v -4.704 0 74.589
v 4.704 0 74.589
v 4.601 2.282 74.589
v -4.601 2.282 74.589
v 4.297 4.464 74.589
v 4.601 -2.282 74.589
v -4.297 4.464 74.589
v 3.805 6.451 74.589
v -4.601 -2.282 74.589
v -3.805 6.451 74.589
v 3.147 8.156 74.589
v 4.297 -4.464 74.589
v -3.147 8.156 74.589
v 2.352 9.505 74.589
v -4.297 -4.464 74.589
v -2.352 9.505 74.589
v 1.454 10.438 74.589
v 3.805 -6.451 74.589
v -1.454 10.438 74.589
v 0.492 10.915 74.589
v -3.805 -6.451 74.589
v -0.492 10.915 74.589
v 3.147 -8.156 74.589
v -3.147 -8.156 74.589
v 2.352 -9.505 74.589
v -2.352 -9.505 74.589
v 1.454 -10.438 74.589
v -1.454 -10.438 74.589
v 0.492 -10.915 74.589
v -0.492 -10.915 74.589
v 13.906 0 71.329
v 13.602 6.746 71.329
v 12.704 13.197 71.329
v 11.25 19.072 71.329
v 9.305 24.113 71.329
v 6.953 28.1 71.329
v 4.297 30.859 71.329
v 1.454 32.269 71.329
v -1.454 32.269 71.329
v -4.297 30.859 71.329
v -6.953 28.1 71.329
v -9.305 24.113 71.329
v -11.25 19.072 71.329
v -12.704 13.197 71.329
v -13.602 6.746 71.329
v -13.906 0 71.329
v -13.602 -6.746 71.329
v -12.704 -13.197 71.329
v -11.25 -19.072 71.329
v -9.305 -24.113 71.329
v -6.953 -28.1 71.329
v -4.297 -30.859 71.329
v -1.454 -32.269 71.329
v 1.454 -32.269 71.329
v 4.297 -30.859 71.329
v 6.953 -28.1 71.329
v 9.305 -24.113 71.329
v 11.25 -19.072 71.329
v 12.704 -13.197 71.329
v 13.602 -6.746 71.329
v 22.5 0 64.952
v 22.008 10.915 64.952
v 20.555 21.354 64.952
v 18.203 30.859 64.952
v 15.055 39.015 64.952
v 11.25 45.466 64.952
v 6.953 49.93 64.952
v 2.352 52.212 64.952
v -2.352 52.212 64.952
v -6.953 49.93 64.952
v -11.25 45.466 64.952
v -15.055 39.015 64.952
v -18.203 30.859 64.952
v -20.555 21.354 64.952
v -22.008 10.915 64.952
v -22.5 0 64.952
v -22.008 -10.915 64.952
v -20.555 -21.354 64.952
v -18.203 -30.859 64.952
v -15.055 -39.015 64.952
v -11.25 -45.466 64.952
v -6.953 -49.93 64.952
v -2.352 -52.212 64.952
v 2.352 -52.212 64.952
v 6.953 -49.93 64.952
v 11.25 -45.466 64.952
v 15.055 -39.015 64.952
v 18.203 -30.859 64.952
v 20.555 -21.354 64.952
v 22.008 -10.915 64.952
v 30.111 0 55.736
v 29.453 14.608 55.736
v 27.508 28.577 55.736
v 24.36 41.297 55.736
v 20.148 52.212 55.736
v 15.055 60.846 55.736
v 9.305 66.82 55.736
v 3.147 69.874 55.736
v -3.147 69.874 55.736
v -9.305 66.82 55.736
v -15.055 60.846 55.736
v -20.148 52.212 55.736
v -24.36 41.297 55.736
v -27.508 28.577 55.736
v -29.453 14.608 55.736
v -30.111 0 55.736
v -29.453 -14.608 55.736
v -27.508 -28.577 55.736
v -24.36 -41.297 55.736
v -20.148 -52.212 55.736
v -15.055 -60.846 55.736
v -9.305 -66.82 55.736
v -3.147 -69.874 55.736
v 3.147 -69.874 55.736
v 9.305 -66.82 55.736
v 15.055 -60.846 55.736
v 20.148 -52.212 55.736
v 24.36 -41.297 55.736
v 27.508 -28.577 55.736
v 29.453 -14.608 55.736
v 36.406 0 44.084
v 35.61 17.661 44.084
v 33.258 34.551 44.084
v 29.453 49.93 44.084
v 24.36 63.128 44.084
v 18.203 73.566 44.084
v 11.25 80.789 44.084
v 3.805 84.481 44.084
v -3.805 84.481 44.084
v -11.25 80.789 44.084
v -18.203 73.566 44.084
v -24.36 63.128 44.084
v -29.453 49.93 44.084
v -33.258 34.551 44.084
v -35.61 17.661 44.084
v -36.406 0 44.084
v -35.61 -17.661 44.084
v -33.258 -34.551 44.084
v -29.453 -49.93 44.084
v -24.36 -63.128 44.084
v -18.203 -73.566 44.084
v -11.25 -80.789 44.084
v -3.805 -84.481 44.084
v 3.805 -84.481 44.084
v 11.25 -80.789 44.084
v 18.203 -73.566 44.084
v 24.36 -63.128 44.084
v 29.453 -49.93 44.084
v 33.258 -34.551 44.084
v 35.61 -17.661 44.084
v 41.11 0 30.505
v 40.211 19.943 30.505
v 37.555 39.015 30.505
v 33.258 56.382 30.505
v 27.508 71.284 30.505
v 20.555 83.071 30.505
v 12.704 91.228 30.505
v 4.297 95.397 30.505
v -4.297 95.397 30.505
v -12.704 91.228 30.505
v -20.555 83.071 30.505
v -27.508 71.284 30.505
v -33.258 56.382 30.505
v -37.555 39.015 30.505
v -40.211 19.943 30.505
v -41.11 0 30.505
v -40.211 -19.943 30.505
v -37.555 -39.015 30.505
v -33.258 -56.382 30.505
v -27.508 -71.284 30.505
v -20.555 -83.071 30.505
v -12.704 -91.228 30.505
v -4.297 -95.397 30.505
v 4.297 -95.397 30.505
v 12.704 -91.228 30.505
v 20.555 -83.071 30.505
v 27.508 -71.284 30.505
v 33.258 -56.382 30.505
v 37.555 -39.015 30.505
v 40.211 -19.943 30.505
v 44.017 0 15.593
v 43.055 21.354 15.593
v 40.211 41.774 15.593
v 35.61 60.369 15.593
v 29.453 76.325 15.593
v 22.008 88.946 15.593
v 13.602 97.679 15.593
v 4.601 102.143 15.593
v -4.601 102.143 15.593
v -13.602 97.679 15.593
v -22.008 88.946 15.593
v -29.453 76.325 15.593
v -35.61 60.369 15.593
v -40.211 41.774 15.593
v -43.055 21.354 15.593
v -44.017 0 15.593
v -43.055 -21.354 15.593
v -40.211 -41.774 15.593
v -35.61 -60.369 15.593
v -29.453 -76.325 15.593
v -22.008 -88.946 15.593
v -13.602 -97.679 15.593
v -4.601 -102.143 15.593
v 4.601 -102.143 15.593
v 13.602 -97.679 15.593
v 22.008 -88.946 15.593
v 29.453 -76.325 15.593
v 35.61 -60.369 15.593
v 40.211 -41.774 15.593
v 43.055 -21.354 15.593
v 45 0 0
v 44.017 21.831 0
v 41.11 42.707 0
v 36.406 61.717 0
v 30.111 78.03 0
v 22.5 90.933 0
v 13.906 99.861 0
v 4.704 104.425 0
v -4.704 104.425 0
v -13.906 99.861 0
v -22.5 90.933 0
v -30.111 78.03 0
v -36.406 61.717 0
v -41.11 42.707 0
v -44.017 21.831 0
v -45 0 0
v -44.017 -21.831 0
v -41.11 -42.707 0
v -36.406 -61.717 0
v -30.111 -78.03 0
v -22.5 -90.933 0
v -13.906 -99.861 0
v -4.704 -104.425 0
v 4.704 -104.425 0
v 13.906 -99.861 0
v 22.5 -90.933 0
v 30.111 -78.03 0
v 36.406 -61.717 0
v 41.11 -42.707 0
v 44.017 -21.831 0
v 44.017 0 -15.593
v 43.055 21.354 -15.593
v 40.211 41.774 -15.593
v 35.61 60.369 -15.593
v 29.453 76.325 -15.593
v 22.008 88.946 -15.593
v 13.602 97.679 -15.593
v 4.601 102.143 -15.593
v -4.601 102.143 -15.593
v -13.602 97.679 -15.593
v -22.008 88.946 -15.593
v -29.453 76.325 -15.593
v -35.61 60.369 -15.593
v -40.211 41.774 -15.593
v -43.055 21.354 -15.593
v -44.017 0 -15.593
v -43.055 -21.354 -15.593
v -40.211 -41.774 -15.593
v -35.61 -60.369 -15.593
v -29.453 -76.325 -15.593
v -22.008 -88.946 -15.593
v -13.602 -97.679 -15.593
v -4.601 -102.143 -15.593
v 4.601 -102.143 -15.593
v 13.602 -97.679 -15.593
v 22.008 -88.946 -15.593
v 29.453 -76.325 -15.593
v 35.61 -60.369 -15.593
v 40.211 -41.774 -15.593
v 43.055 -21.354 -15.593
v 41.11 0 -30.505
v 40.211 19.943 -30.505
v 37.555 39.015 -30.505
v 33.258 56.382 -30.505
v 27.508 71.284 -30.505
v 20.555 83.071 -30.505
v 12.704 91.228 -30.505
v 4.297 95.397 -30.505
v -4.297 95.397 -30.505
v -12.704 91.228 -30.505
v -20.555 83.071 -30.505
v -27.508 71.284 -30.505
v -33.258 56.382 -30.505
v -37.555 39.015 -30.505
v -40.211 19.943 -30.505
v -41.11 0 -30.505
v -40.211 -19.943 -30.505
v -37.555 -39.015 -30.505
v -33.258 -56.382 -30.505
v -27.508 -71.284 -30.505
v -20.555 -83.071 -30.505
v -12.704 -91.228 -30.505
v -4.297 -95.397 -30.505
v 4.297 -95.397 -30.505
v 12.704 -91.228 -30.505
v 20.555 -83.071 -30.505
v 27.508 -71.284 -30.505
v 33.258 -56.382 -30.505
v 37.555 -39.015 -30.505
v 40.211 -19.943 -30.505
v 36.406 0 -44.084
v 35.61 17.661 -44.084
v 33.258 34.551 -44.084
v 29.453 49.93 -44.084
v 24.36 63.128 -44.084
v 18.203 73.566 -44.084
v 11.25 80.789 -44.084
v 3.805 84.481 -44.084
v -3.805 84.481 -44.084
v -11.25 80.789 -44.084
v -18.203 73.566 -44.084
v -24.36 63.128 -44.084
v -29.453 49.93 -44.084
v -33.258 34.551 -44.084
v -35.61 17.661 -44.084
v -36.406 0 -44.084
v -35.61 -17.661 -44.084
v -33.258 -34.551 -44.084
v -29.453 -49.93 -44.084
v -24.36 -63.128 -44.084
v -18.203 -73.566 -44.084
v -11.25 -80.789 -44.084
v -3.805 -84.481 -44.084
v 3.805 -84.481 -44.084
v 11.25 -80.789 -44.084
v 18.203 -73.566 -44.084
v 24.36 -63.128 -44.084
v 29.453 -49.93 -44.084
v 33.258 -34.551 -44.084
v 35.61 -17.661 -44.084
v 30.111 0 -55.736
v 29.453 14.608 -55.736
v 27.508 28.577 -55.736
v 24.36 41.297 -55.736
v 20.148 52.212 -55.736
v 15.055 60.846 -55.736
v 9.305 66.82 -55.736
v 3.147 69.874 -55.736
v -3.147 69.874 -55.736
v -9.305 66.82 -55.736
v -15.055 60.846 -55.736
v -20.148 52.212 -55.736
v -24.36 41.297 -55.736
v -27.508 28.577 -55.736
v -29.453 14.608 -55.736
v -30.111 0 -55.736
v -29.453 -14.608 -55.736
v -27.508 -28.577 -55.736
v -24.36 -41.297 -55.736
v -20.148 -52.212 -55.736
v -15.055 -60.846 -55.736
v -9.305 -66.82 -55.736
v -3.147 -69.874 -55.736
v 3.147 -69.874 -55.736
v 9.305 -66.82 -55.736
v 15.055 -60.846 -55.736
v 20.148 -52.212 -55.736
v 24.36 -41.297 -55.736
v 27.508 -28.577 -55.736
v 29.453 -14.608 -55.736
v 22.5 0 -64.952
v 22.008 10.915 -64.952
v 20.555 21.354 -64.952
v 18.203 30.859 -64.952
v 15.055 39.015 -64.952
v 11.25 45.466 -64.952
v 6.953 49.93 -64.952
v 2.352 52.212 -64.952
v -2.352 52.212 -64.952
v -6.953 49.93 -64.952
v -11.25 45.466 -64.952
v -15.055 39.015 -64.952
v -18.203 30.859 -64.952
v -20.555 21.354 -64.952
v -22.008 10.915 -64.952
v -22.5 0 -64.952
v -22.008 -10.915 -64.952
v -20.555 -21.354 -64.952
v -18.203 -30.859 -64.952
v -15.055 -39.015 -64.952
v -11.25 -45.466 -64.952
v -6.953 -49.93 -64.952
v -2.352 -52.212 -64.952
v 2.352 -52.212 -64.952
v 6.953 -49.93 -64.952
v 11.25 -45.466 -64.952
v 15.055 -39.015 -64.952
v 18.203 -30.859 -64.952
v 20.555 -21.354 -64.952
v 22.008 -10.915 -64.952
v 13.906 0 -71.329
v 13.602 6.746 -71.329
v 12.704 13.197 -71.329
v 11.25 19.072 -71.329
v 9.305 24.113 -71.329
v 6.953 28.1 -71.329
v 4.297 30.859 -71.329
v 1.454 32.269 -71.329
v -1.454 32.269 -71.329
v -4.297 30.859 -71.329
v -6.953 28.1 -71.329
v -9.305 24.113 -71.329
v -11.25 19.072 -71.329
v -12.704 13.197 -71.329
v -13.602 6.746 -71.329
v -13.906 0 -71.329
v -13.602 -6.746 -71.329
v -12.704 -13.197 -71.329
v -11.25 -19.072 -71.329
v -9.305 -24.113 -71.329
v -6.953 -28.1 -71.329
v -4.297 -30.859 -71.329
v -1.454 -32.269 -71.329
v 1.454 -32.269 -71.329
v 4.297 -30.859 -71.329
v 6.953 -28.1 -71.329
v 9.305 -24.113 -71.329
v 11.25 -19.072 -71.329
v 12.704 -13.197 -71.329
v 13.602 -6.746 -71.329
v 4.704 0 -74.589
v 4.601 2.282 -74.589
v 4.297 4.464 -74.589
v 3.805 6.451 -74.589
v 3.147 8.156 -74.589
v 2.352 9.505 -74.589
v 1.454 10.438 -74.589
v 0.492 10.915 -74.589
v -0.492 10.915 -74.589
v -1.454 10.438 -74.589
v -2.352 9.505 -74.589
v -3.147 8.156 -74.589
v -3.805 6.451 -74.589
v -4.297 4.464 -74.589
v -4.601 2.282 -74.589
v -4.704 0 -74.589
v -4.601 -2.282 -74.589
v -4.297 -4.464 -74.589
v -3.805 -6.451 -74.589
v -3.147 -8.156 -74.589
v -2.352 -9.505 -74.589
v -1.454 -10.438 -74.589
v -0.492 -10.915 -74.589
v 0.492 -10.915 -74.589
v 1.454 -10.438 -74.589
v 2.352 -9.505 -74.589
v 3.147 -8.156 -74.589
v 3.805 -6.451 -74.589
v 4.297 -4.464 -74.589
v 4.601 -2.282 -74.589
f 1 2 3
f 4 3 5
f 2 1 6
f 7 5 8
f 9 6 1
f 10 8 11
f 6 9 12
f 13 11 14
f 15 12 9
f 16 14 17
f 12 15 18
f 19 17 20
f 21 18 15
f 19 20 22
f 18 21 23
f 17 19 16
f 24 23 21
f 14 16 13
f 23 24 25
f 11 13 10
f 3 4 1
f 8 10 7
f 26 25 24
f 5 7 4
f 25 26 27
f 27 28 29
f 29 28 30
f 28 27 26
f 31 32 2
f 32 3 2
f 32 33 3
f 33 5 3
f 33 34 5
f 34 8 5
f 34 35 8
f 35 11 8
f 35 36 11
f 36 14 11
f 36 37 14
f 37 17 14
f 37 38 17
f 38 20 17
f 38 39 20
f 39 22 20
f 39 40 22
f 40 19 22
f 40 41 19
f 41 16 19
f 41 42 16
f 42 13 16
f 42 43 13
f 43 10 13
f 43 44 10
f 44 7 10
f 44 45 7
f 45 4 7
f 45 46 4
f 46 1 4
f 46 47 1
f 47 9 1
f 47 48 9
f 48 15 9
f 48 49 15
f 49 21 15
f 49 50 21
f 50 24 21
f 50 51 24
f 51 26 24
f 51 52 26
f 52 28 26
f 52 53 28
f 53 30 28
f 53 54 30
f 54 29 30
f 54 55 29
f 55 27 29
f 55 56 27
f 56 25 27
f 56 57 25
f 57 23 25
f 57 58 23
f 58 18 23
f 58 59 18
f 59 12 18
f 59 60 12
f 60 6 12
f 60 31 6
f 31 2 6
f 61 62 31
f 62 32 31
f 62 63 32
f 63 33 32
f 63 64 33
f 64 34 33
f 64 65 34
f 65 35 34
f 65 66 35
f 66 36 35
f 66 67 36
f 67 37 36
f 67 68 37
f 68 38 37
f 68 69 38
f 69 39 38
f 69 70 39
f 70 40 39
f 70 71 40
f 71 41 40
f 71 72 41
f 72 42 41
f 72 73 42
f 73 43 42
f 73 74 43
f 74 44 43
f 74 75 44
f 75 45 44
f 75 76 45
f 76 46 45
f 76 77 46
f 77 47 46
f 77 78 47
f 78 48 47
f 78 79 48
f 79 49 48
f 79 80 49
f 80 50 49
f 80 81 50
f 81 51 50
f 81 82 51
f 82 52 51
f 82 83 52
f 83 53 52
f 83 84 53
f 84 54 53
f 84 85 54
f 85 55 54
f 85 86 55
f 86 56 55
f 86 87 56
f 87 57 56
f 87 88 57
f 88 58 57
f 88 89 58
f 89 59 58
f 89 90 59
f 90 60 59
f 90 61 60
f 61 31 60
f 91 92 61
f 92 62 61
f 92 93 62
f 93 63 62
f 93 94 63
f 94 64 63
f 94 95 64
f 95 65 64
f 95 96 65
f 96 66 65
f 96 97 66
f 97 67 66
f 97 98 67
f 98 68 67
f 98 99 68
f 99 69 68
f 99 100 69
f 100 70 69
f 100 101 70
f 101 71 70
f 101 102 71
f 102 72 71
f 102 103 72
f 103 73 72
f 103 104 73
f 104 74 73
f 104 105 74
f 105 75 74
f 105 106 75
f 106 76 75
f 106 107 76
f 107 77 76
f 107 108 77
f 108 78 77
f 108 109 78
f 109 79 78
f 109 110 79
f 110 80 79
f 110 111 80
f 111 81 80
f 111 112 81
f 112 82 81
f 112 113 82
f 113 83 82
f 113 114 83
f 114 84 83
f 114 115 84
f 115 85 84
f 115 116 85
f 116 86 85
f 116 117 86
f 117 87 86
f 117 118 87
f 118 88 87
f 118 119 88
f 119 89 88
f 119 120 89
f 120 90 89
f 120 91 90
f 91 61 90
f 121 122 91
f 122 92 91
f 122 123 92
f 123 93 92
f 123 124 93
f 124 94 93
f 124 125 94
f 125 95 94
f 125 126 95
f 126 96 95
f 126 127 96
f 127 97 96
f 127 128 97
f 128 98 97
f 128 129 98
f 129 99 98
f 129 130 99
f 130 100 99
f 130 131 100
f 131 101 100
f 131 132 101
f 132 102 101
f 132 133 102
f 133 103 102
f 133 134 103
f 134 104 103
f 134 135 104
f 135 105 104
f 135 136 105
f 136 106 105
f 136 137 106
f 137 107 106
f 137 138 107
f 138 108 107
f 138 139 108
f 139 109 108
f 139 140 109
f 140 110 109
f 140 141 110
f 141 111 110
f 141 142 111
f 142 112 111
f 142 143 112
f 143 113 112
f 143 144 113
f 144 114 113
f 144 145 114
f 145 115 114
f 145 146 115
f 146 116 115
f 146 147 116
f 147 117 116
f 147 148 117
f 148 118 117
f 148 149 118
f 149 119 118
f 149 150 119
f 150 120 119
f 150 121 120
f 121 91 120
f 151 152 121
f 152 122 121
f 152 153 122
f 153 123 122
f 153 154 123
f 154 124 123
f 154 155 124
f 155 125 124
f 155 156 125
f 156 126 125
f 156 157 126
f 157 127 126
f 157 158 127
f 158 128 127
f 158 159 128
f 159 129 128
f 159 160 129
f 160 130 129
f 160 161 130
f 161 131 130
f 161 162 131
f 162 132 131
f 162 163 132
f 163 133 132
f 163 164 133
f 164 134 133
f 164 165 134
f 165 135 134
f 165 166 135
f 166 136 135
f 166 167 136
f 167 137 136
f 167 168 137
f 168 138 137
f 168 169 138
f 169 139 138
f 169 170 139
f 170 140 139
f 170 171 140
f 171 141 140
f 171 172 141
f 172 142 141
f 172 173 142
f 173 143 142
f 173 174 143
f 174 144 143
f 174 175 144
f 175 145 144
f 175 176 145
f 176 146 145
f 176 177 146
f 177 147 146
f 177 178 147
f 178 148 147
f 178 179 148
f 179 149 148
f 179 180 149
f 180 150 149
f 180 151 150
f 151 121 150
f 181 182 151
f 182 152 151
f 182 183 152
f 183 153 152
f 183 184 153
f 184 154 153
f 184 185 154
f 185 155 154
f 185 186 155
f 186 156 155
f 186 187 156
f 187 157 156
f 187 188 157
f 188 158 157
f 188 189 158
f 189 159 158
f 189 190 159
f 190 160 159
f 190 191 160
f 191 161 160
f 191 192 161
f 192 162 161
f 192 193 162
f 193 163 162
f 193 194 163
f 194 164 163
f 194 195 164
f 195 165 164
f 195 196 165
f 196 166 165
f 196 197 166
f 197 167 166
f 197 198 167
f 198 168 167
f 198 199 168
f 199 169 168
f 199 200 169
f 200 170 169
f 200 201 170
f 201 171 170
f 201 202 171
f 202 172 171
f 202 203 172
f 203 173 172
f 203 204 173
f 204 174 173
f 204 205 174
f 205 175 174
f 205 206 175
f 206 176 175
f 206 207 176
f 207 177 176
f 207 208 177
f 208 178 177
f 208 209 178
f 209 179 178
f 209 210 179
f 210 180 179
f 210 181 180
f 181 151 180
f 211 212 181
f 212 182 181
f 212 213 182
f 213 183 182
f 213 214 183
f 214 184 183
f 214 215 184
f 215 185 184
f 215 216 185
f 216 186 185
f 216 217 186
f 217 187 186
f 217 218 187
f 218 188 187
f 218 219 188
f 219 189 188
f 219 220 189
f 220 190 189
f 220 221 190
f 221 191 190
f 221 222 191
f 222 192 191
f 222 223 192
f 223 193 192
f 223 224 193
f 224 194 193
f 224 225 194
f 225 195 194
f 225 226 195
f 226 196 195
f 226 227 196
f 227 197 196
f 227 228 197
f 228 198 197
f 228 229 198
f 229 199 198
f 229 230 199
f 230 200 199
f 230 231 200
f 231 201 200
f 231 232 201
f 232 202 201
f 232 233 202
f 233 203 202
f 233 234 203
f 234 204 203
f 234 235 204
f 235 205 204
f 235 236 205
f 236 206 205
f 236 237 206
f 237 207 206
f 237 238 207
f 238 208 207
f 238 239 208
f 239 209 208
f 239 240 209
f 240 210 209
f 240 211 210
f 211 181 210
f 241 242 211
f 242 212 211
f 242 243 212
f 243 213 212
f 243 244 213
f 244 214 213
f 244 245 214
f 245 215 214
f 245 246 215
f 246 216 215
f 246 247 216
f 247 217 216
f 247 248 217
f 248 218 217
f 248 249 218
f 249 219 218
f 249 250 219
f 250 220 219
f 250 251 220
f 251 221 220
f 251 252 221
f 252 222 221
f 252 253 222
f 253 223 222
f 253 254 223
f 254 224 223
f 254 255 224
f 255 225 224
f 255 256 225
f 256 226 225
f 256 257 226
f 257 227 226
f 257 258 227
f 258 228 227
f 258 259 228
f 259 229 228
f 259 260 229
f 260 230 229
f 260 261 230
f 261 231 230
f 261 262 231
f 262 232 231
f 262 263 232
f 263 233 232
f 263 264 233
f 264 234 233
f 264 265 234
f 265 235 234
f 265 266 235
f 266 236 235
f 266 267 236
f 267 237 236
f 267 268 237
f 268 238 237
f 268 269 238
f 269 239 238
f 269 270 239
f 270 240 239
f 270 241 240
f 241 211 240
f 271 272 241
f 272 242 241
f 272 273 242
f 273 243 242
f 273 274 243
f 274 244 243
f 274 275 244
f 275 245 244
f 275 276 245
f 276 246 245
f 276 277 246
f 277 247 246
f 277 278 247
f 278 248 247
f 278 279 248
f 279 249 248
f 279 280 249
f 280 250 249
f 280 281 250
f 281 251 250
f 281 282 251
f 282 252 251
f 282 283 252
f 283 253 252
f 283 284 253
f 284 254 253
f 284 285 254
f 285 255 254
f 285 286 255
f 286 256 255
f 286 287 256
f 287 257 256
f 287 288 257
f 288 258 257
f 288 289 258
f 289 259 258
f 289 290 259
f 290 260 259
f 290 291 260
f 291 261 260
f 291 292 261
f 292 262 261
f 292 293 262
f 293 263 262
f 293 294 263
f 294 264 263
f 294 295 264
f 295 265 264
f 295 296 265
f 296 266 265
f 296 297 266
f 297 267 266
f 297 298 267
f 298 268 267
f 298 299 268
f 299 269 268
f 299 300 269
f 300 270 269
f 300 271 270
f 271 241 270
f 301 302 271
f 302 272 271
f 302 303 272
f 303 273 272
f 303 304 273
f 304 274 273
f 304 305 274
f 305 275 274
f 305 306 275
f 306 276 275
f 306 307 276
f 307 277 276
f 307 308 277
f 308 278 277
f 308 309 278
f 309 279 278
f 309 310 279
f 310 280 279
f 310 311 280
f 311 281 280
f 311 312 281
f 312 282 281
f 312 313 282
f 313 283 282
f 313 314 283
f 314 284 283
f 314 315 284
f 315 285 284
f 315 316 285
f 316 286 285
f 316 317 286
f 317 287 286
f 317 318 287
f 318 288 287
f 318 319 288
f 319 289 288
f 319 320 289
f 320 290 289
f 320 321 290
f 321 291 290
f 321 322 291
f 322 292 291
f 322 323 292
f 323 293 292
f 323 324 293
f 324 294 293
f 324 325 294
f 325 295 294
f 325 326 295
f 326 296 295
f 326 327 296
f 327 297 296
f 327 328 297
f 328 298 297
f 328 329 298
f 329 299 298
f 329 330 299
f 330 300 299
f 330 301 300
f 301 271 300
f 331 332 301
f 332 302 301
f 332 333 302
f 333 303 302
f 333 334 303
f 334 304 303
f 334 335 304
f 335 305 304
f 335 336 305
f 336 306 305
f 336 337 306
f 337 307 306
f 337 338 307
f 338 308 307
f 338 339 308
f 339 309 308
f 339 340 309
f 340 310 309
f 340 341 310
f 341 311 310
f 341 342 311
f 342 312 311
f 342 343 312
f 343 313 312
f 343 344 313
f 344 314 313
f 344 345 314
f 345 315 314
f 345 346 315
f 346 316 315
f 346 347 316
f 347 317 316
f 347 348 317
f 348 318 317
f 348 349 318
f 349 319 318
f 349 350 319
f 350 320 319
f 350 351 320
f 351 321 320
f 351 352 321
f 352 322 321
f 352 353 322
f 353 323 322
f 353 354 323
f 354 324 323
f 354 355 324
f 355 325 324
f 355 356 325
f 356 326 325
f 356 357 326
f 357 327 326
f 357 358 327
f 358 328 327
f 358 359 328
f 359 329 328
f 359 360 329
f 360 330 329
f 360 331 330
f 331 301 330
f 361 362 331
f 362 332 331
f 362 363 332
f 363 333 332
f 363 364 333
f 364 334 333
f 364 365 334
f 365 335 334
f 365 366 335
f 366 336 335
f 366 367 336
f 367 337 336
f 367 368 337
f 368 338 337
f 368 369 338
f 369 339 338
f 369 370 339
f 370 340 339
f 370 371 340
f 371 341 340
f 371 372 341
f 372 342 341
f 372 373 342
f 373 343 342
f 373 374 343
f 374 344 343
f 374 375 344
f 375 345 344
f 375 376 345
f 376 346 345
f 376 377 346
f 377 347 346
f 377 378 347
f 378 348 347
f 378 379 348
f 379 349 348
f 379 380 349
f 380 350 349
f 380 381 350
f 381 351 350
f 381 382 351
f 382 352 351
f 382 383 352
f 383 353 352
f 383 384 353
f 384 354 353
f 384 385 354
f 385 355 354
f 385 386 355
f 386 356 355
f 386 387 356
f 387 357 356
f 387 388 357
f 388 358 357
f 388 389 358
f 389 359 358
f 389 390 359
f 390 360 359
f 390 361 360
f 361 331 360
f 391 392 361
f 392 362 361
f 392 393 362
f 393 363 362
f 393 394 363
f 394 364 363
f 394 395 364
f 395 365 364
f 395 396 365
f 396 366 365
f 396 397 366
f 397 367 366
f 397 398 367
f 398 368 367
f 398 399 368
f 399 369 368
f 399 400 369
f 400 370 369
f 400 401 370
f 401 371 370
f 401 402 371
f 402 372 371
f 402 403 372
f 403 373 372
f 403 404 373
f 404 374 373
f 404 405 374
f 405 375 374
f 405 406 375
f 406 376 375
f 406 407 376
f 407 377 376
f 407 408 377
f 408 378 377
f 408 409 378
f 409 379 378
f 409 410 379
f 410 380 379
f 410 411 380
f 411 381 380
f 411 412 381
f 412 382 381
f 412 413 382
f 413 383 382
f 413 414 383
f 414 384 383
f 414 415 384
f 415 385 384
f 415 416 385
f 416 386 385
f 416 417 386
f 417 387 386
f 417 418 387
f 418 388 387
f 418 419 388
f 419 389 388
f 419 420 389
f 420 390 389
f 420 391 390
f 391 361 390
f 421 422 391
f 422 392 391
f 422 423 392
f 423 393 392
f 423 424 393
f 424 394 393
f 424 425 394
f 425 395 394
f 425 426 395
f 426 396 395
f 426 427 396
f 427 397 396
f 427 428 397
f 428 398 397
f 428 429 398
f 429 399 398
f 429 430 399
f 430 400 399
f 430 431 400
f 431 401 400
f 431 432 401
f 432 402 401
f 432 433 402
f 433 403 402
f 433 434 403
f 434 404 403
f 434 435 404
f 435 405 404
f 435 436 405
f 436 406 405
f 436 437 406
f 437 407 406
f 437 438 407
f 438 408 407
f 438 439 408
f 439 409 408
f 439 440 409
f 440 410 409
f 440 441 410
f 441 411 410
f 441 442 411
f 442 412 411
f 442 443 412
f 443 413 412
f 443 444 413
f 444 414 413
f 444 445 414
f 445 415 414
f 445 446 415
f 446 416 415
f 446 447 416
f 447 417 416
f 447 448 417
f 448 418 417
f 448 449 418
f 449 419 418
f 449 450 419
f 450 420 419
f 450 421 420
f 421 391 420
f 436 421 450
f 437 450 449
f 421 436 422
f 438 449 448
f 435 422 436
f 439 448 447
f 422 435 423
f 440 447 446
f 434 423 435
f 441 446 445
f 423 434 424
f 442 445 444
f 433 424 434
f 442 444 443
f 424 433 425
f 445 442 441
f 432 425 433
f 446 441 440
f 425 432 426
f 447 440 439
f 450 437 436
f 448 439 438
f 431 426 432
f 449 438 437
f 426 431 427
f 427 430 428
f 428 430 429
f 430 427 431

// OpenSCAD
// Generated by SolidPython 1.0.1 on 2020-07-29 00:46:45


scale(v = [3, 7, 5]) {
	sphere(r = 15);
}
/***********************************************
*********      SolidPython code:      **********
************************************************
 
# import packages: SolidPython
from solid import *
from solid.utils import *
from itertools import chain, combinations, permutations


class Resize:

    def __init__(self, scad_file):
        self.scad_file = scad_file
        #self.scad_file = import_scad(scad_file)
        # cone/cylinder param:
        self.r1 = 0
        self.r2 = 0
        self.h = 0
        # rectangular prism param:
        self.w = 0
        self.l = 0
        # ellipse param:
        self.r = 0

    # import OpenScad code (file name corresponds to shape)


    # classify shape + parameters
    def assign(self, param1, param2, param3):
        if self.scad_file == 'cone.scad':
            self.r1 = param1
            self.r2 = param2
            self.h = param3
        elif self.scad_file == 'cylinder.scad':
            self.r1 = param1
            self.r2 = param2
            self.h = param3
        elif self.scad_file == 'rectangularPrism.scad':
            self.h = param1
            self.l = param2
            self.w = param3
        else:
            self.r = param1
            self.h = param2

    # resize parameters
    def iterate(self):
        x = range(3, 20, 2)
        i = 1
        if self.scad_file == 'cone.scad':
            tempList = list(permutations(x, 2))
            for temp in tempList:
                param1 = temp[0]
                param2 = temp[1]
                filepath = 'produced_scad_files/' + 'cone' + str(param1) + '_' + str(param2) + '_' + '.scad'
                scad_render_to_file(cylinder(h=param1, r1=param2, r2=0), filepath)

        elif self.scad_file == 'cylinder.scad':
            tempList = list(permutations(x, 3))
            for temp in tempList:
                param1 = temp[0]
                param2 = temp[1]
                filepath = 'produced_scad_files/' + 'cylinder' + str(param1) + '_' + str(param2) + '_' + '.scad'
                scad_render_to_file(cylinder(h=param1, r1=param2, r2=param2), filepath)

        elif self.scad_file == 'rectangularPrism.scad':
            tempList = list(permutations(x, 3))
            for temp in tempList:
                param1 = temp[0]
                param2 = temp[1]
                param3 = temp[2]
                filepath = 'produced_scad_files/' + 'rectangularPrism' + str(param1) + '_' + str(param2) + '_' + str(
                    param3) + '.scad'
                scad_render_to_file(cube(size=(param1, param2, param3)), filepath)

        elif self.scad_file == 'ellipse.scad':
            tempList = list(permutations(x, 4))
            for temp in tempList:
                param1 = temp[0]
                param2 = temp[1]
                param3 = temp[2]
                param4 = temp[3]
                filepath = 'produced_scad_files/' + 'ellipse' + str(param1) + '_' + str(param2) + '_' + str(param3) + '_' + str(param4) + '.scad'
                scad_render_to_file(scale([param1, param2, param3])(sphere(r=param4)), filepath)

    def render_to_scadfile(self):
        scad_render_to_file(scad, 'example.scad') 
 
************************************************/
